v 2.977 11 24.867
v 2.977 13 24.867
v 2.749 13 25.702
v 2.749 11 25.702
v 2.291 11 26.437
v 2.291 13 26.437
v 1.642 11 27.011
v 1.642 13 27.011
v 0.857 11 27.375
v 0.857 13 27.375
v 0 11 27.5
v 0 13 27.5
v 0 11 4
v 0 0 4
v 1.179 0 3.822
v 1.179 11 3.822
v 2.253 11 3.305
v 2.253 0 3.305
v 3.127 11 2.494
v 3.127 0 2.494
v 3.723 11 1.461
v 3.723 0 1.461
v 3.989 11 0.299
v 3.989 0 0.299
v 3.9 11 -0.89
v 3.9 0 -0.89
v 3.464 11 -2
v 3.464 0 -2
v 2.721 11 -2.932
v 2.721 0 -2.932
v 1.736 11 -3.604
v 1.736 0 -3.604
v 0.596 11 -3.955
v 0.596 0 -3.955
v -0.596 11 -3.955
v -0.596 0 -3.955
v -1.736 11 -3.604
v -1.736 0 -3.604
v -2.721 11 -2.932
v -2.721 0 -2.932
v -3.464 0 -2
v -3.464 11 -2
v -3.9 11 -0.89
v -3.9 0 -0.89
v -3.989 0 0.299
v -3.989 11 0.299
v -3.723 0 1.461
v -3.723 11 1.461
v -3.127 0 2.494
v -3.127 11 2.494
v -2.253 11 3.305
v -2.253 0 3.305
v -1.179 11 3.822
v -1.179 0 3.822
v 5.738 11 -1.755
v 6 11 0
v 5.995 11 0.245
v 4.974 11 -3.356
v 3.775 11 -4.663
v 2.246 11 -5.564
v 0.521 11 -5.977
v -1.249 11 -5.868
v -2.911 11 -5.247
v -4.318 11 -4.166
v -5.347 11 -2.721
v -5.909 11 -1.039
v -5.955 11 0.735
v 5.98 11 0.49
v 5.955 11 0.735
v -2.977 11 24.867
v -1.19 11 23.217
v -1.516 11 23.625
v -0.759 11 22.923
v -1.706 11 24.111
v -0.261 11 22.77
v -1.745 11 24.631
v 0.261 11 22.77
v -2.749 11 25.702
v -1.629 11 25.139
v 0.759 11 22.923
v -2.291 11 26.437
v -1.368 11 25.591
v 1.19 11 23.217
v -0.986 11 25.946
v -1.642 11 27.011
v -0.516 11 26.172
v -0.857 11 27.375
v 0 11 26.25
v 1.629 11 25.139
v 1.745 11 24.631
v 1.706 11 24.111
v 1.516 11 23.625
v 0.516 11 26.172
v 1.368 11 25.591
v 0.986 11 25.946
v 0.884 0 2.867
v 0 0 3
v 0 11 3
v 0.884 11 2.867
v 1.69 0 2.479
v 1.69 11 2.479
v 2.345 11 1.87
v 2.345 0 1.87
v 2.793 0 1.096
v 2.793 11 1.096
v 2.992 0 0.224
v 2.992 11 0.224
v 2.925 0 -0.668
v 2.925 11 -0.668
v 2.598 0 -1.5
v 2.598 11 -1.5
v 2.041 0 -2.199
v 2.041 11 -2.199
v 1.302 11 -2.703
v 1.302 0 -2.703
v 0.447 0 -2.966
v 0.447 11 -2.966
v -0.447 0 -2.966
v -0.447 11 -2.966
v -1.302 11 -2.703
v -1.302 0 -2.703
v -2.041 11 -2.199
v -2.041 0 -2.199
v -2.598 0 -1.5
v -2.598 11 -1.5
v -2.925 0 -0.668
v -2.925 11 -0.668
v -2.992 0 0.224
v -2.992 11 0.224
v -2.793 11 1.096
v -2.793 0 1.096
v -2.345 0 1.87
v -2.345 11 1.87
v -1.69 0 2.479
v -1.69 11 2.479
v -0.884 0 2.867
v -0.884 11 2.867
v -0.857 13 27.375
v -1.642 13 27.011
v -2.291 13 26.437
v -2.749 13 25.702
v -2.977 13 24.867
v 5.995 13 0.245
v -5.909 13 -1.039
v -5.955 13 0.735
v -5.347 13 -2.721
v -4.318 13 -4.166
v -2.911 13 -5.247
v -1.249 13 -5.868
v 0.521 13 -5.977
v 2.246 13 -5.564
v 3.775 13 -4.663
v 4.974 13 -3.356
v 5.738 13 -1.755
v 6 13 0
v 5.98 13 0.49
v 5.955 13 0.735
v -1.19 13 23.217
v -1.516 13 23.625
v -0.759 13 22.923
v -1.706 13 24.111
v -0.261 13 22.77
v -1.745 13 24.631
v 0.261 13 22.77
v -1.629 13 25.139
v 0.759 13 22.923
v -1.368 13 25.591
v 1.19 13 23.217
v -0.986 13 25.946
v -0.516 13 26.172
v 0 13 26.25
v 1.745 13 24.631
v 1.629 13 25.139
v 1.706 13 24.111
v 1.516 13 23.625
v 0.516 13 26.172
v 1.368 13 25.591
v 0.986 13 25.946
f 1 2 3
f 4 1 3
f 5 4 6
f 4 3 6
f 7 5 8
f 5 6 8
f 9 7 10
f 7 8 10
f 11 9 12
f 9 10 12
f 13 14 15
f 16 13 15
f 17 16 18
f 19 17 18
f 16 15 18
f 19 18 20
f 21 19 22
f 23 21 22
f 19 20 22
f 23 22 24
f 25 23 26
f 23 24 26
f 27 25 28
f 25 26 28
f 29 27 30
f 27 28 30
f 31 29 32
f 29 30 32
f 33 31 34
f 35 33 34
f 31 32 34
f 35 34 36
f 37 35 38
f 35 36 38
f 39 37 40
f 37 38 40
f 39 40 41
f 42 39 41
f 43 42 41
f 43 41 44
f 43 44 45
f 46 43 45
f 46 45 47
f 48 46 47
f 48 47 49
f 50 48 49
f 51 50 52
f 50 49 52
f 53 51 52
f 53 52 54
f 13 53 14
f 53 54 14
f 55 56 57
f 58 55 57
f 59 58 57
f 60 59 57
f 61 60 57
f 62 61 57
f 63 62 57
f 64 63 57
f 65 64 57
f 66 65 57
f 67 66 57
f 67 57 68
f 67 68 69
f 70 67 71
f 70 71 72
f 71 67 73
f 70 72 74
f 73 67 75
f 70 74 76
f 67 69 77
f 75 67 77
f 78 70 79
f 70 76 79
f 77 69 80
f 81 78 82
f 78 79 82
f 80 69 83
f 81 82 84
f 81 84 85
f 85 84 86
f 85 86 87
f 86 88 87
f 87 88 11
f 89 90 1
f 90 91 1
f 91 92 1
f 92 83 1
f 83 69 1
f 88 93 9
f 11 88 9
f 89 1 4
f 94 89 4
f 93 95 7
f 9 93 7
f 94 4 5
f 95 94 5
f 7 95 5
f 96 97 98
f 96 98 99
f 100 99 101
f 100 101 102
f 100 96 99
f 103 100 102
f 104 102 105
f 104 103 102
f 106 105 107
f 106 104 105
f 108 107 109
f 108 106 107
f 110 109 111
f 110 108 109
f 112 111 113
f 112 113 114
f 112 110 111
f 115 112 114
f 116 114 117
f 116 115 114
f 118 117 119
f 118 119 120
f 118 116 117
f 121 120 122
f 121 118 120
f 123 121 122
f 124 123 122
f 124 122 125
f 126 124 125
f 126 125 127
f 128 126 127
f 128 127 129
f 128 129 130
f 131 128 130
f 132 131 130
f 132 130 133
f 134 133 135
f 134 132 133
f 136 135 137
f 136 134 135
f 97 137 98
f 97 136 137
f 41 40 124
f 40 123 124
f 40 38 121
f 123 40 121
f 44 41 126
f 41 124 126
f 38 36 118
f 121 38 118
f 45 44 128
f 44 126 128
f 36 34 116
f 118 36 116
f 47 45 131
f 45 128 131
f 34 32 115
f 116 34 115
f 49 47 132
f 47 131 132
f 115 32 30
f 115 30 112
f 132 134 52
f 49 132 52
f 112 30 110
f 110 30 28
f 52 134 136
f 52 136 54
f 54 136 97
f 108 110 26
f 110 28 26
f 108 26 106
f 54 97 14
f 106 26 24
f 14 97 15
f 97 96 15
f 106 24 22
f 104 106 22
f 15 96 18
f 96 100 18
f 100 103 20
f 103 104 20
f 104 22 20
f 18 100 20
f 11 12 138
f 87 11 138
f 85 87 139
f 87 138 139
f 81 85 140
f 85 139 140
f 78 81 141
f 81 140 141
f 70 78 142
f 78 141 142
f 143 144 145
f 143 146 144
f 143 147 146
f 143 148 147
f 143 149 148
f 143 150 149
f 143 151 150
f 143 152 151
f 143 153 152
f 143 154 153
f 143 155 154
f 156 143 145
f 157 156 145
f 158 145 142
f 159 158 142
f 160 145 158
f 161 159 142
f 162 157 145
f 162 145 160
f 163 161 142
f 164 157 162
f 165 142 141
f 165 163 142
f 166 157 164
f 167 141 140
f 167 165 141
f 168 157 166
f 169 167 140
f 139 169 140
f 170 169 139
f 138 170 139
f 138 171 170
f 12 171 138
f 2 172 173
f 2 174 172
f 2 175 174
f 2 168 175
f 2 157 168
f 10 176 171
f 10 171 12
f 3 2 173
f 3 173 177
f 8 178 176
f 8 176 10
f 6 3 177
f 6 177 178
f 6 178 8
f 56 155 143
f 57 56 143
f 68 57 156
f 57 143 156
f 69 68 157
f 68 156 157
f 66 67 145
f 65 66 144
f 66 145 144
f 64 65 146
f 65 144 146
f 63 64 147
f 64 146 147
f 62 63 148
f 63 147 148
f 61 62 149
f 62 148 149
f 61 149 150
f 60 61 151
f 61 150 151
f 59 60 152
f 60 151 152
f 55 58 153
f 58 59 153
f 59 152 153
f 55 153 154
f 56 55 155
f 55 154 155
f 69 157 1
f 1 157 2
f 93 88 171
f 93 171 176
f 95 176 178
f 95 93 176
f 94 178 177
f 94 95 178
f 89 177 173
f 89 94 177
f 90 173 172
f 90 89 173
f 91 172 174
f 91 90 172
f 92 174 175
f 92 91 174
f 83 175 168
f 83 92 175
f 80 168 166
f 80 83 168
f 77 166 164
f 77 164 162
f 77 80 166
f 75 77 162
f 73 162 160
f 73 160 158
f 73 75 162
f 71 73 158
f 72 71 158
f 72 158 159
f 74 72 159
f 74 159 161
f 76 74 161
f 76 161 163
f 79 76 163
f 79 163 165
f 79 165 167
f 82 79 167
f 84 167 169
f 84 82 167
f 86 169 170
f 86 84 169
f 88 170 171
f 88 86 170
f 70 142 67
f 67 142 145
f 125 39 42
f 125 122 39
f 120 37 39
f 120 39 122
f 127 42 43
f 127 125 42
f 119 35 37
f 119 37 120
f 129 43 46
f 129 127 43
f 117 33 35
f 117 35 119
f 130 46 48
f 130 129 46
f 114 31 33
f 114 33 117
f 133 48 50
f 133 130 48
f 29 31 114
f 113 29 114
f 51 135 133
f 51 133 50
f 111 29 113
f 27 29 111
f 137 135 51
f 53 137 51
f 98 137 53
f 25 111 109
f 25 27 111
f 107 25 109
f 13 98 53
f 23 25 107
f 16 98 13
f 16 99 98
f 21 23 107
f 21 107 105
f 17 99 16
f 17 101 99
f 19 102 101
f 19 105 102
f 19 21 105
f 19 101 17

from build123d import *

# Parameters (mm, degrees)
SKETCH1_R           = 4
SKETCH1_R_2         = 3
BOSS_EXTRUDE1_DEPTH = 11
SKETCH2_R           = 27.5
SKETCH2_R_2         = 1.75
BOSS_EXTRUDE2_DEPTH = 2
SKETCH3_R           = 41.685165186
SKETCH3_R_2         = 27.5
CUT_EXTRUDE2_DEPTH  = 42.006097108


with BuildPart() as part:
    # Sketch1 → Boss-Extrude1 (new body)
    with BuildSketch(Plane(origin=(0, 0, 0), x_dir=(1, 0, 0), z_dir=(0, 1, 0))):
        with Locations(Location((0, 0, 0), (0, 0, 270))):
            Circle(SKETCH1_R)
        with Locations(Location((0, 0, 0), (0, 0, 270))):
            Circle(SKETCH1_R_2, mode=Mode.SUBTRACT)
    extrude(amount=BOSS_EXTRUDE1_DEPTH)


with BuildPart() as body_2:
    # Sketch2 → Boss-Extrude2 (new body)
    with BuildSketch(Plane(origin=(0, 11, 0), x_dir=(1, 0, 0), z_dir=(0, 1, 0))):
        with Locations(Location((0, 0, 0), (0, 0, 270))):
            Circle(SKETCH2_R)
        with Locations(Location((0, -24.5, 0), (0, 0, 270))):
            Circle(SKETCH2_R_2, mode=Mode.SUBTRACT)
    extrude(amount=BOSS_EXTRUDE2_DEPTH)

    # Sketch3 → Cut-Extrude2 (cut, through all)
    with BuildSketch(Plane(origin=(0, 13, 0), x_dir=(1, 0, 0), z_dir=(0, 1, 0))):
        Circle(SKETCH3_R)
        Circle(SKETCH3_R_2, mode=Mode.SUBTRACT)
        with BuildLine():
            ThreePointArc((27.5, 0), (-19.445436483, 19.445436483), (0, -27.5))
            ThreePointArc((0, -27.5), (19.445436483, -19.445436483), (27.5, 0))
        make_face()
        with BuildLine():
            ThreePointArc((0, -27.5), (-1.987203963, -26.747447532), (-2.977424428, -24.867346939))
            Line((-2.977424428, -24.867346939), (-5.954848857, -0.734693878))
            ThreePointArc((-5.954848857, -0.734693878), (-0.368039984, 5.988701576), (6, 0))
            ThreePointArc((6, 0), (5.988701576, -0.368039984), (5.954848857, -0.734693878))
            Line((5.954848857, -0.734693878), (2.977424428, -24.867346939))
            ThreePointArc((2.977424428, -24.867346939), (1.987203963, -26.747447532), (0, -27.5))
        make_face(mode=Mode.SUBTRACT)
    extrude(amount=-CUT_EXTRUDE2_DEPTH, mode=Mode.SUBTRACT)


solid = Compound([part.part, body_2.part])
